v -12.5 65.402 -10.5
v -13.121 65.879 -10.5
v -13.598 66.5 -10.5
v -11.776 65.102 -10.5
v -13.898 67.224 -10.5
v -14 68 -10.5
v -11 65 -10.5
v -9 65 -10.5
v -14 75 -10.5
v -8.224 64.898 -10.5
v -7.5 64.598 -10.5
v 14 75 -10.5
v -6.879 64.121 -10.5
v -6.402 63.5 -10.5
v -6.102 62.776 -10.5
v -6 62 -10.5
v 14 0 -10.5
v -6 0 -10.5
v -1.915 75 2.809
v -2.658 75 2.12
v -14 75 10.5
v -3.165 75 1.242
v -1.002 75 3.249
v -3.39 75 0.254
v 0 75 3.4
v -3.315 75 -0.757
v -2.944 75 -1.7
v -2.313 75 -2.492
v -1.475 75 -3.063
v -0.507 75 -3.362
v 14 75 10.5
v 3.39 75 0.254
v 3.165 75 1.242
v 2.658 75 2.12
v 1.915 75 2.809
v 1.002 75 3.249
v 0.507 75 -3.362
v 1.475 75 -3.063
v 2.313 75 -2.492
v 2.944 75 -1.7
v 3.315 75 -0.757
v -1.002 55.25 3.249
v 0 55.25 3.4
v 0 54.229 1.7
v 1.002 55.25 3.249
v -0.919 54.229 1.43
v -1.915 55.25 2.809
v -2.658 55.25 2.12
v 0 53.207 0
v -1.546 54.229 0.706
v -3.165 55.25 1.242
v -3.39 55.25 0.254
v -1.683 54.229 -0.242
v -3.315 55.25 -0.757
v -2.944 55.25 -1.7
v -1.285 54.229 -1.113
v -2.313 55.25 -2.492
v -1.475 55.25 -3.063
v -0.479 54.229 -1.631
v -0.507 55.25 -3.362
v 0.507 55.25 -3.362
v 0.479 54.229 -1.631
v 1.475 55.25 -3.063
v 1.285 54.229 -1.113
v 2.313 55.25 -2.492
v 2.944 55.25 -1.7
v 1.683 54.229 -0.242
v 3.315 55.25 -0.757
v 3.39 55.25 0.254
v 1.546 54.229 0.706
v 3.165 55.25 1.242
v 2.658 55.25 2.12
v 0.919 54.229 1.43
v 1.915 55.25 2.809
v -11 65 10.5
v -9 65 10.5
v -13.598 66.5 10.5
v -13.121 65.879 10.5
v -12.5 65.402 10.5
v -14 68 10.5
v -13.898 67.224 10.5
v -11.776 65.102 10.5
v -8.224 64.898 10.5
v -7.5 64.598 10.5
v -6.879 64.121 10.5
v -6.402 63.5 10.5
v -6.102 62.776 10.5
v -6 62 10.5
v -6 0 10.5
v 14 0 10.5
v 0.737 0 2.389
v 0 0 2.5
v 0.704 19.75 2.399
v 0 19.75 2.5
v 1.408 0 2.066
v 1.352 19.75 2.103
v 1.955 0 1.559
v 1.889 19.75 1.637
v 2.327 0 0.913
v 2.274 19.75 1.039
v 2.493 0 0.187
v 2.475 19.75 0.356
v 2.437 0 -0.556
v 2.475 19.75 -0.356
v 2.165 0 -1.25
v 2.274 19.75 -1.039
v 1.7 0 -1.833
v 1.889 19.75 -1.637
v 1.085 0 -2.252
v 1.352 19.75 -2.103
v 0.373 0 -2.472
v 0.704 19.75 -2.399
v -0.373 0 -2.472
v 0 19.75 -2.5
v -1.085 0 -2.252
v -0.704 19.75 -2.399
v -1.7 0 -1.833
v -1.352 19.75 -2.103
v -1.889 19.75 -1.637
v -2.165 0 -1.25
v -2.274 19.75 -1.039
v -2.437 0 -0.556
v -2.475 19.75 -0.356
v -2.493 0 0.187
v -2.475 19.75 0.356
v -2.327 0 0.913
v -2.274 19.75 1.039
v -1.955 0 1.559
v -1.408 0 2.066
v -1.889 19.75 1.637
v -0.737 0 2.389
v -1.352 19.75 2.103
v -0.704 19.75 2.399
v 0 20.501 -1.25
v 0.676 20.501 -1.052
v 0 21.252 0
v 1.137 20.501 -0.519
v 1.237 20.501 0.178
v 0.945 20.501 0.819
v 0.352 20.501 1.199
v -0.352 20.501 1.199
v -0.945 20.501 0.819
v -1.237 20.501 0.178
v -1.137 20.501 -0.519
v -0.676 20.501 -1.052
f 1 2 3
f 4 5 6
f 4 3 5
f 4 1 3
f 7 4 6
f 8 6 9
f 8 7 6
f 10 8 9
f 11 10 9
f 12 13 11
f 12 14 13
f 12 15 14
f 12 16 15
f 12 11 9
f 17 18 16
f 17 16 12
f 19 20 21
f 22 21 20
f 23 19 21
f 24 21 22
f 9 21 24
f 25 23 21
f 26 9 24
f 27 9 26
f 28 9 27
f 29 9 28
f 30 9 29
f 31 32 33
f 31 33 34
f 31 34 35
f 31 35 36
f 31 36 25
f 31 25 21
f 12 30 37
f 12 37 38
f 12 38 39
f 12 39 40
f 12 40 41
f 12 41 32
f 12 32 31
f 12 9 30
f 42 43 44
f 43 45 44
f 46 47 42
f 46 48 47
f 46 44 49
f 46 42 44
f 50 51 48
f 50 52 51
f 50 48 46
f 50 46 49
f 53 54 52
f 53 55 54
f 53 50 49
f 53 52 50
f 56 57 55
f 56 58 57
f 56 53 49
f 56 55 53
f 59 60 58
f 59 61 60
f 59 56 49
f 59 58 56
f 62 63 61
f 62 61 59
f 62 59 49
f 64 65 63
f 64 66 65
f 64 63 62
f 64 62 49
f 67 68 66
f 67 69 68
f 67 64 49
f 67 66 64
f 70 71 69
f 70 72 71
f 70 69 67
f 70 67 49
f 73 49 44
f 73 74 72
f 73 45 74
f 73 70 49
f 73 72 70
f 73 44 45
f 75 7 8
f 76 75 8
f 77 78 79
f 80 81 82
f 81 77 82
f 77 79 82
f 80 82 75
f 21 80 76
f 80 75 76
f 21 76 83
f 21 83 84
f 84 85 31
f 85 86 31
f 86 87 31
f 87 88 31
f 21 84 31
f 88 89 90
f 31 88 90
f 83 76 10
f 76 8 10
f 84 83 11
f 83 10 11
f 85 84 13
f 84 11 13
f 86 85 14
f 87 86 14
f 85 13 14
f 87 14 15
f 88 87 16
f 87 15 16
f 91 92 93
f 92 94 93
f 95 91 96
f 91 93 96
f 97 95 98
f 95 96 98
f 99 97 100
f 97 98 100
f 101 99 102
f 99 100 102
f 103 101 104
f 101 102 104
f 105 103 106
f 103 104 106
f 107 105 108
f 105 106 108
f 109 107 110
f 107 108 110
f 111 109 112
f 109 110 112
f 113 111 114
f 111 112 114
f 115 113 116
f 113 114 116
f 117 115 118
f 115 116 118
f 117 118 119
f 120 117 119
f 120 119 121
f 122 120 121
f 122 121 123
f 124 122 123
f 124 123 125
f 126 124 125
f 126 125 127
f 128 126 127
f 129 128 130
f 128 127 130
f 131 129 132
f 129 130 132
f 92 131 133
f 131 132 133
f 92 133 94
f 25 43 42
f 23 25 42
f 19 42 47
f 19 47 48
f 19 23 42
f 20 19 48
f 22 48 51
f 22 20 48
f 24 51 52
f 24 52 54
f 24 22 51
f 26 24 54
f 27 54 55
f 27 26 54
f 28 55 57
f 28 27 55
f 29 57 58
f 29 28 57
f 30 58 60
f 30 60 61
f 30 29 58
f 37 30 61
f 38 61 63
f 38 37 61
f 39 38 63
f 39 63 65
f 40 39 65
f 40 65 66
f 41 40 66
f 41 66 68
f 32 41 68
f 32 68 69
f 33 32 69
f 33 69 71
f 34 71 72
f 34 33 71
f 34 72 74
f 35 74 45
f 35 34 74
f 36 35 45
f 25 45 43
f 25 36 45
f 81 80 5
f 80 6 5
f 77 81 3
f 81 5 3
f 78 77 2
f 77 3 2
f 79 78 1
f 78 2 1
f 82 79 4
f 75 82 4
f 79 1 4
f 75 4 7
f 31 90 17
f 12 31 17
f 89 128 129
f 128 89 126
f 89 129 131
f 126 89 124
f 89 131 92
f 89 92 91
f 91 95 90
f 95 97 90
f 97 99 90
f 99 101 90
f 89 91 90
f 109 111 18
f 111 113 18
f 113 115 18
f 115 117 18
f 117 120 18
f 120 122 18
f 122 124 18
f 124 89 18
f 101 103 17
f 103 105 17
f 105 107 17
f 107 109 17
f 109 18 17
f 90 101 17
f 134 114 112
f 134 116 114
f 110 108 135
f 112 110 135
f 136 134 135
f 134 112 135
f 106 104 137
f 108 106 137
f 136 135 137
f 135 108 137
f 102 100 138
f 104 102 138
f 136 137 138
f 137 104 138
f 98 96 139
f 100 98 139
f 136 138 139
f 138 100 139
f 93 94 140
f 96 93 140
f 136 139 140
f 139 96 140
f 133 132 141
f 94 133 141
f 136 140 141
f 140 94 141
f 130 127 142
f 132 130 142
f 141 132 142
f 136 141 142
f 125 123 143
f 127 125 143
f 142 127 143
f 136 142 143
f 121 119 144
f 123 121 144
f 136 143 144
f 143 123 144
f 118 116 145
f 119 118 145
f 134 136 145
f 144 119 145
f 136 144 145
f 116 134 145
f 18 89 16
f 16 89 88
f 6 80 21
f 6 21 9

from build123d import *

# Parameters (mm, degrees)
SKETCH_1_W             = 28
SKETCH_1_H             = 21
EXTRUDE_1_DEPTH        = 75
SKETCH_6_W             = 8
SKETCH_6_H             = 65
CUT_EXTRUDE_1_DEPTH    = 22
FILLET_3_R             = 3
HOLE_WIZARD_M6_1_D     = 5
HOLE_WIZARD_M6_1_DEPTH = 19.75
HOLE_WIZARD_M6_1_TIP   = 1.502151548


with BuildPart() as part:
    # 草图1 → 凸台-拉伸1 (new body)
    with BuildSketch(Plane(origin=(0, 0, 0), x_dir=(1, 0, 0), z_dir=(0, 1, 0))):
        Rectangle(SKETCH_1_W, SKETCH_1_H)
    extrude(amount=EXTRUDE_1_DEPTH)

    # 草图5 → M8 螺纹孔1 (revolve, cut)
    with BuildSketch(Plane(origin=(0, 75, 0), x_dir=(0, 0, 1), z_dir=(1, 0, 0))):
        Polygon((0, 0), (0, 21.792926105), (3.4, 19.75), (3.4, 0), align=None)
    revolve(axis=Axis((0, 81.35, 0), (0, -1, 0)), mode=Mode.SUBTRACT)

    # 草图6 → 切除-拉伸1 (cut, through all)
    with BuildSketch(Plane.XY.offset(10.5)):
        with Locations((-10, 32.5)):
            Rectangle(SKETCH_6_W, SKETCH_6_H)
    extrude(amount=-CUT_EXTRUDE_1_DEPTH, mode=Mode.SUBTRACT)

    # 圆角3
    fillet_3_edges = [part.edges().sort_by_distance(p)[0] for p in [
        (-14, 65, 0),
        (-6, 65, 0),
    ]]
    fillet(fillet_3_edges, radius=FILLET_3_R)

    # M6 螺纹孔1
    with Locations(Plane(origin=(0, 0, 0), x_dir=(0, 0, -1), z_dir=(0, -1, 0))):
        with Locations((0, 0)):
            Hole(HOLE_WIZARD_M6_1_D / 2, depth=HOLE_WIZARD_M6_1_DEPTH)
            with Locations((0, 0, -(HOLE_WIZARD_M6_1_DEPTH + HOLE_WIZARD_M6_1_TIP / 2))):  # 118° drill point
                Cone(0, HOLE_WIZARD_M6_1_D / 2, HOLE_WIZARD_M6_1_TIP, mode=Mode.SUBTRACT)


solid = part.part
